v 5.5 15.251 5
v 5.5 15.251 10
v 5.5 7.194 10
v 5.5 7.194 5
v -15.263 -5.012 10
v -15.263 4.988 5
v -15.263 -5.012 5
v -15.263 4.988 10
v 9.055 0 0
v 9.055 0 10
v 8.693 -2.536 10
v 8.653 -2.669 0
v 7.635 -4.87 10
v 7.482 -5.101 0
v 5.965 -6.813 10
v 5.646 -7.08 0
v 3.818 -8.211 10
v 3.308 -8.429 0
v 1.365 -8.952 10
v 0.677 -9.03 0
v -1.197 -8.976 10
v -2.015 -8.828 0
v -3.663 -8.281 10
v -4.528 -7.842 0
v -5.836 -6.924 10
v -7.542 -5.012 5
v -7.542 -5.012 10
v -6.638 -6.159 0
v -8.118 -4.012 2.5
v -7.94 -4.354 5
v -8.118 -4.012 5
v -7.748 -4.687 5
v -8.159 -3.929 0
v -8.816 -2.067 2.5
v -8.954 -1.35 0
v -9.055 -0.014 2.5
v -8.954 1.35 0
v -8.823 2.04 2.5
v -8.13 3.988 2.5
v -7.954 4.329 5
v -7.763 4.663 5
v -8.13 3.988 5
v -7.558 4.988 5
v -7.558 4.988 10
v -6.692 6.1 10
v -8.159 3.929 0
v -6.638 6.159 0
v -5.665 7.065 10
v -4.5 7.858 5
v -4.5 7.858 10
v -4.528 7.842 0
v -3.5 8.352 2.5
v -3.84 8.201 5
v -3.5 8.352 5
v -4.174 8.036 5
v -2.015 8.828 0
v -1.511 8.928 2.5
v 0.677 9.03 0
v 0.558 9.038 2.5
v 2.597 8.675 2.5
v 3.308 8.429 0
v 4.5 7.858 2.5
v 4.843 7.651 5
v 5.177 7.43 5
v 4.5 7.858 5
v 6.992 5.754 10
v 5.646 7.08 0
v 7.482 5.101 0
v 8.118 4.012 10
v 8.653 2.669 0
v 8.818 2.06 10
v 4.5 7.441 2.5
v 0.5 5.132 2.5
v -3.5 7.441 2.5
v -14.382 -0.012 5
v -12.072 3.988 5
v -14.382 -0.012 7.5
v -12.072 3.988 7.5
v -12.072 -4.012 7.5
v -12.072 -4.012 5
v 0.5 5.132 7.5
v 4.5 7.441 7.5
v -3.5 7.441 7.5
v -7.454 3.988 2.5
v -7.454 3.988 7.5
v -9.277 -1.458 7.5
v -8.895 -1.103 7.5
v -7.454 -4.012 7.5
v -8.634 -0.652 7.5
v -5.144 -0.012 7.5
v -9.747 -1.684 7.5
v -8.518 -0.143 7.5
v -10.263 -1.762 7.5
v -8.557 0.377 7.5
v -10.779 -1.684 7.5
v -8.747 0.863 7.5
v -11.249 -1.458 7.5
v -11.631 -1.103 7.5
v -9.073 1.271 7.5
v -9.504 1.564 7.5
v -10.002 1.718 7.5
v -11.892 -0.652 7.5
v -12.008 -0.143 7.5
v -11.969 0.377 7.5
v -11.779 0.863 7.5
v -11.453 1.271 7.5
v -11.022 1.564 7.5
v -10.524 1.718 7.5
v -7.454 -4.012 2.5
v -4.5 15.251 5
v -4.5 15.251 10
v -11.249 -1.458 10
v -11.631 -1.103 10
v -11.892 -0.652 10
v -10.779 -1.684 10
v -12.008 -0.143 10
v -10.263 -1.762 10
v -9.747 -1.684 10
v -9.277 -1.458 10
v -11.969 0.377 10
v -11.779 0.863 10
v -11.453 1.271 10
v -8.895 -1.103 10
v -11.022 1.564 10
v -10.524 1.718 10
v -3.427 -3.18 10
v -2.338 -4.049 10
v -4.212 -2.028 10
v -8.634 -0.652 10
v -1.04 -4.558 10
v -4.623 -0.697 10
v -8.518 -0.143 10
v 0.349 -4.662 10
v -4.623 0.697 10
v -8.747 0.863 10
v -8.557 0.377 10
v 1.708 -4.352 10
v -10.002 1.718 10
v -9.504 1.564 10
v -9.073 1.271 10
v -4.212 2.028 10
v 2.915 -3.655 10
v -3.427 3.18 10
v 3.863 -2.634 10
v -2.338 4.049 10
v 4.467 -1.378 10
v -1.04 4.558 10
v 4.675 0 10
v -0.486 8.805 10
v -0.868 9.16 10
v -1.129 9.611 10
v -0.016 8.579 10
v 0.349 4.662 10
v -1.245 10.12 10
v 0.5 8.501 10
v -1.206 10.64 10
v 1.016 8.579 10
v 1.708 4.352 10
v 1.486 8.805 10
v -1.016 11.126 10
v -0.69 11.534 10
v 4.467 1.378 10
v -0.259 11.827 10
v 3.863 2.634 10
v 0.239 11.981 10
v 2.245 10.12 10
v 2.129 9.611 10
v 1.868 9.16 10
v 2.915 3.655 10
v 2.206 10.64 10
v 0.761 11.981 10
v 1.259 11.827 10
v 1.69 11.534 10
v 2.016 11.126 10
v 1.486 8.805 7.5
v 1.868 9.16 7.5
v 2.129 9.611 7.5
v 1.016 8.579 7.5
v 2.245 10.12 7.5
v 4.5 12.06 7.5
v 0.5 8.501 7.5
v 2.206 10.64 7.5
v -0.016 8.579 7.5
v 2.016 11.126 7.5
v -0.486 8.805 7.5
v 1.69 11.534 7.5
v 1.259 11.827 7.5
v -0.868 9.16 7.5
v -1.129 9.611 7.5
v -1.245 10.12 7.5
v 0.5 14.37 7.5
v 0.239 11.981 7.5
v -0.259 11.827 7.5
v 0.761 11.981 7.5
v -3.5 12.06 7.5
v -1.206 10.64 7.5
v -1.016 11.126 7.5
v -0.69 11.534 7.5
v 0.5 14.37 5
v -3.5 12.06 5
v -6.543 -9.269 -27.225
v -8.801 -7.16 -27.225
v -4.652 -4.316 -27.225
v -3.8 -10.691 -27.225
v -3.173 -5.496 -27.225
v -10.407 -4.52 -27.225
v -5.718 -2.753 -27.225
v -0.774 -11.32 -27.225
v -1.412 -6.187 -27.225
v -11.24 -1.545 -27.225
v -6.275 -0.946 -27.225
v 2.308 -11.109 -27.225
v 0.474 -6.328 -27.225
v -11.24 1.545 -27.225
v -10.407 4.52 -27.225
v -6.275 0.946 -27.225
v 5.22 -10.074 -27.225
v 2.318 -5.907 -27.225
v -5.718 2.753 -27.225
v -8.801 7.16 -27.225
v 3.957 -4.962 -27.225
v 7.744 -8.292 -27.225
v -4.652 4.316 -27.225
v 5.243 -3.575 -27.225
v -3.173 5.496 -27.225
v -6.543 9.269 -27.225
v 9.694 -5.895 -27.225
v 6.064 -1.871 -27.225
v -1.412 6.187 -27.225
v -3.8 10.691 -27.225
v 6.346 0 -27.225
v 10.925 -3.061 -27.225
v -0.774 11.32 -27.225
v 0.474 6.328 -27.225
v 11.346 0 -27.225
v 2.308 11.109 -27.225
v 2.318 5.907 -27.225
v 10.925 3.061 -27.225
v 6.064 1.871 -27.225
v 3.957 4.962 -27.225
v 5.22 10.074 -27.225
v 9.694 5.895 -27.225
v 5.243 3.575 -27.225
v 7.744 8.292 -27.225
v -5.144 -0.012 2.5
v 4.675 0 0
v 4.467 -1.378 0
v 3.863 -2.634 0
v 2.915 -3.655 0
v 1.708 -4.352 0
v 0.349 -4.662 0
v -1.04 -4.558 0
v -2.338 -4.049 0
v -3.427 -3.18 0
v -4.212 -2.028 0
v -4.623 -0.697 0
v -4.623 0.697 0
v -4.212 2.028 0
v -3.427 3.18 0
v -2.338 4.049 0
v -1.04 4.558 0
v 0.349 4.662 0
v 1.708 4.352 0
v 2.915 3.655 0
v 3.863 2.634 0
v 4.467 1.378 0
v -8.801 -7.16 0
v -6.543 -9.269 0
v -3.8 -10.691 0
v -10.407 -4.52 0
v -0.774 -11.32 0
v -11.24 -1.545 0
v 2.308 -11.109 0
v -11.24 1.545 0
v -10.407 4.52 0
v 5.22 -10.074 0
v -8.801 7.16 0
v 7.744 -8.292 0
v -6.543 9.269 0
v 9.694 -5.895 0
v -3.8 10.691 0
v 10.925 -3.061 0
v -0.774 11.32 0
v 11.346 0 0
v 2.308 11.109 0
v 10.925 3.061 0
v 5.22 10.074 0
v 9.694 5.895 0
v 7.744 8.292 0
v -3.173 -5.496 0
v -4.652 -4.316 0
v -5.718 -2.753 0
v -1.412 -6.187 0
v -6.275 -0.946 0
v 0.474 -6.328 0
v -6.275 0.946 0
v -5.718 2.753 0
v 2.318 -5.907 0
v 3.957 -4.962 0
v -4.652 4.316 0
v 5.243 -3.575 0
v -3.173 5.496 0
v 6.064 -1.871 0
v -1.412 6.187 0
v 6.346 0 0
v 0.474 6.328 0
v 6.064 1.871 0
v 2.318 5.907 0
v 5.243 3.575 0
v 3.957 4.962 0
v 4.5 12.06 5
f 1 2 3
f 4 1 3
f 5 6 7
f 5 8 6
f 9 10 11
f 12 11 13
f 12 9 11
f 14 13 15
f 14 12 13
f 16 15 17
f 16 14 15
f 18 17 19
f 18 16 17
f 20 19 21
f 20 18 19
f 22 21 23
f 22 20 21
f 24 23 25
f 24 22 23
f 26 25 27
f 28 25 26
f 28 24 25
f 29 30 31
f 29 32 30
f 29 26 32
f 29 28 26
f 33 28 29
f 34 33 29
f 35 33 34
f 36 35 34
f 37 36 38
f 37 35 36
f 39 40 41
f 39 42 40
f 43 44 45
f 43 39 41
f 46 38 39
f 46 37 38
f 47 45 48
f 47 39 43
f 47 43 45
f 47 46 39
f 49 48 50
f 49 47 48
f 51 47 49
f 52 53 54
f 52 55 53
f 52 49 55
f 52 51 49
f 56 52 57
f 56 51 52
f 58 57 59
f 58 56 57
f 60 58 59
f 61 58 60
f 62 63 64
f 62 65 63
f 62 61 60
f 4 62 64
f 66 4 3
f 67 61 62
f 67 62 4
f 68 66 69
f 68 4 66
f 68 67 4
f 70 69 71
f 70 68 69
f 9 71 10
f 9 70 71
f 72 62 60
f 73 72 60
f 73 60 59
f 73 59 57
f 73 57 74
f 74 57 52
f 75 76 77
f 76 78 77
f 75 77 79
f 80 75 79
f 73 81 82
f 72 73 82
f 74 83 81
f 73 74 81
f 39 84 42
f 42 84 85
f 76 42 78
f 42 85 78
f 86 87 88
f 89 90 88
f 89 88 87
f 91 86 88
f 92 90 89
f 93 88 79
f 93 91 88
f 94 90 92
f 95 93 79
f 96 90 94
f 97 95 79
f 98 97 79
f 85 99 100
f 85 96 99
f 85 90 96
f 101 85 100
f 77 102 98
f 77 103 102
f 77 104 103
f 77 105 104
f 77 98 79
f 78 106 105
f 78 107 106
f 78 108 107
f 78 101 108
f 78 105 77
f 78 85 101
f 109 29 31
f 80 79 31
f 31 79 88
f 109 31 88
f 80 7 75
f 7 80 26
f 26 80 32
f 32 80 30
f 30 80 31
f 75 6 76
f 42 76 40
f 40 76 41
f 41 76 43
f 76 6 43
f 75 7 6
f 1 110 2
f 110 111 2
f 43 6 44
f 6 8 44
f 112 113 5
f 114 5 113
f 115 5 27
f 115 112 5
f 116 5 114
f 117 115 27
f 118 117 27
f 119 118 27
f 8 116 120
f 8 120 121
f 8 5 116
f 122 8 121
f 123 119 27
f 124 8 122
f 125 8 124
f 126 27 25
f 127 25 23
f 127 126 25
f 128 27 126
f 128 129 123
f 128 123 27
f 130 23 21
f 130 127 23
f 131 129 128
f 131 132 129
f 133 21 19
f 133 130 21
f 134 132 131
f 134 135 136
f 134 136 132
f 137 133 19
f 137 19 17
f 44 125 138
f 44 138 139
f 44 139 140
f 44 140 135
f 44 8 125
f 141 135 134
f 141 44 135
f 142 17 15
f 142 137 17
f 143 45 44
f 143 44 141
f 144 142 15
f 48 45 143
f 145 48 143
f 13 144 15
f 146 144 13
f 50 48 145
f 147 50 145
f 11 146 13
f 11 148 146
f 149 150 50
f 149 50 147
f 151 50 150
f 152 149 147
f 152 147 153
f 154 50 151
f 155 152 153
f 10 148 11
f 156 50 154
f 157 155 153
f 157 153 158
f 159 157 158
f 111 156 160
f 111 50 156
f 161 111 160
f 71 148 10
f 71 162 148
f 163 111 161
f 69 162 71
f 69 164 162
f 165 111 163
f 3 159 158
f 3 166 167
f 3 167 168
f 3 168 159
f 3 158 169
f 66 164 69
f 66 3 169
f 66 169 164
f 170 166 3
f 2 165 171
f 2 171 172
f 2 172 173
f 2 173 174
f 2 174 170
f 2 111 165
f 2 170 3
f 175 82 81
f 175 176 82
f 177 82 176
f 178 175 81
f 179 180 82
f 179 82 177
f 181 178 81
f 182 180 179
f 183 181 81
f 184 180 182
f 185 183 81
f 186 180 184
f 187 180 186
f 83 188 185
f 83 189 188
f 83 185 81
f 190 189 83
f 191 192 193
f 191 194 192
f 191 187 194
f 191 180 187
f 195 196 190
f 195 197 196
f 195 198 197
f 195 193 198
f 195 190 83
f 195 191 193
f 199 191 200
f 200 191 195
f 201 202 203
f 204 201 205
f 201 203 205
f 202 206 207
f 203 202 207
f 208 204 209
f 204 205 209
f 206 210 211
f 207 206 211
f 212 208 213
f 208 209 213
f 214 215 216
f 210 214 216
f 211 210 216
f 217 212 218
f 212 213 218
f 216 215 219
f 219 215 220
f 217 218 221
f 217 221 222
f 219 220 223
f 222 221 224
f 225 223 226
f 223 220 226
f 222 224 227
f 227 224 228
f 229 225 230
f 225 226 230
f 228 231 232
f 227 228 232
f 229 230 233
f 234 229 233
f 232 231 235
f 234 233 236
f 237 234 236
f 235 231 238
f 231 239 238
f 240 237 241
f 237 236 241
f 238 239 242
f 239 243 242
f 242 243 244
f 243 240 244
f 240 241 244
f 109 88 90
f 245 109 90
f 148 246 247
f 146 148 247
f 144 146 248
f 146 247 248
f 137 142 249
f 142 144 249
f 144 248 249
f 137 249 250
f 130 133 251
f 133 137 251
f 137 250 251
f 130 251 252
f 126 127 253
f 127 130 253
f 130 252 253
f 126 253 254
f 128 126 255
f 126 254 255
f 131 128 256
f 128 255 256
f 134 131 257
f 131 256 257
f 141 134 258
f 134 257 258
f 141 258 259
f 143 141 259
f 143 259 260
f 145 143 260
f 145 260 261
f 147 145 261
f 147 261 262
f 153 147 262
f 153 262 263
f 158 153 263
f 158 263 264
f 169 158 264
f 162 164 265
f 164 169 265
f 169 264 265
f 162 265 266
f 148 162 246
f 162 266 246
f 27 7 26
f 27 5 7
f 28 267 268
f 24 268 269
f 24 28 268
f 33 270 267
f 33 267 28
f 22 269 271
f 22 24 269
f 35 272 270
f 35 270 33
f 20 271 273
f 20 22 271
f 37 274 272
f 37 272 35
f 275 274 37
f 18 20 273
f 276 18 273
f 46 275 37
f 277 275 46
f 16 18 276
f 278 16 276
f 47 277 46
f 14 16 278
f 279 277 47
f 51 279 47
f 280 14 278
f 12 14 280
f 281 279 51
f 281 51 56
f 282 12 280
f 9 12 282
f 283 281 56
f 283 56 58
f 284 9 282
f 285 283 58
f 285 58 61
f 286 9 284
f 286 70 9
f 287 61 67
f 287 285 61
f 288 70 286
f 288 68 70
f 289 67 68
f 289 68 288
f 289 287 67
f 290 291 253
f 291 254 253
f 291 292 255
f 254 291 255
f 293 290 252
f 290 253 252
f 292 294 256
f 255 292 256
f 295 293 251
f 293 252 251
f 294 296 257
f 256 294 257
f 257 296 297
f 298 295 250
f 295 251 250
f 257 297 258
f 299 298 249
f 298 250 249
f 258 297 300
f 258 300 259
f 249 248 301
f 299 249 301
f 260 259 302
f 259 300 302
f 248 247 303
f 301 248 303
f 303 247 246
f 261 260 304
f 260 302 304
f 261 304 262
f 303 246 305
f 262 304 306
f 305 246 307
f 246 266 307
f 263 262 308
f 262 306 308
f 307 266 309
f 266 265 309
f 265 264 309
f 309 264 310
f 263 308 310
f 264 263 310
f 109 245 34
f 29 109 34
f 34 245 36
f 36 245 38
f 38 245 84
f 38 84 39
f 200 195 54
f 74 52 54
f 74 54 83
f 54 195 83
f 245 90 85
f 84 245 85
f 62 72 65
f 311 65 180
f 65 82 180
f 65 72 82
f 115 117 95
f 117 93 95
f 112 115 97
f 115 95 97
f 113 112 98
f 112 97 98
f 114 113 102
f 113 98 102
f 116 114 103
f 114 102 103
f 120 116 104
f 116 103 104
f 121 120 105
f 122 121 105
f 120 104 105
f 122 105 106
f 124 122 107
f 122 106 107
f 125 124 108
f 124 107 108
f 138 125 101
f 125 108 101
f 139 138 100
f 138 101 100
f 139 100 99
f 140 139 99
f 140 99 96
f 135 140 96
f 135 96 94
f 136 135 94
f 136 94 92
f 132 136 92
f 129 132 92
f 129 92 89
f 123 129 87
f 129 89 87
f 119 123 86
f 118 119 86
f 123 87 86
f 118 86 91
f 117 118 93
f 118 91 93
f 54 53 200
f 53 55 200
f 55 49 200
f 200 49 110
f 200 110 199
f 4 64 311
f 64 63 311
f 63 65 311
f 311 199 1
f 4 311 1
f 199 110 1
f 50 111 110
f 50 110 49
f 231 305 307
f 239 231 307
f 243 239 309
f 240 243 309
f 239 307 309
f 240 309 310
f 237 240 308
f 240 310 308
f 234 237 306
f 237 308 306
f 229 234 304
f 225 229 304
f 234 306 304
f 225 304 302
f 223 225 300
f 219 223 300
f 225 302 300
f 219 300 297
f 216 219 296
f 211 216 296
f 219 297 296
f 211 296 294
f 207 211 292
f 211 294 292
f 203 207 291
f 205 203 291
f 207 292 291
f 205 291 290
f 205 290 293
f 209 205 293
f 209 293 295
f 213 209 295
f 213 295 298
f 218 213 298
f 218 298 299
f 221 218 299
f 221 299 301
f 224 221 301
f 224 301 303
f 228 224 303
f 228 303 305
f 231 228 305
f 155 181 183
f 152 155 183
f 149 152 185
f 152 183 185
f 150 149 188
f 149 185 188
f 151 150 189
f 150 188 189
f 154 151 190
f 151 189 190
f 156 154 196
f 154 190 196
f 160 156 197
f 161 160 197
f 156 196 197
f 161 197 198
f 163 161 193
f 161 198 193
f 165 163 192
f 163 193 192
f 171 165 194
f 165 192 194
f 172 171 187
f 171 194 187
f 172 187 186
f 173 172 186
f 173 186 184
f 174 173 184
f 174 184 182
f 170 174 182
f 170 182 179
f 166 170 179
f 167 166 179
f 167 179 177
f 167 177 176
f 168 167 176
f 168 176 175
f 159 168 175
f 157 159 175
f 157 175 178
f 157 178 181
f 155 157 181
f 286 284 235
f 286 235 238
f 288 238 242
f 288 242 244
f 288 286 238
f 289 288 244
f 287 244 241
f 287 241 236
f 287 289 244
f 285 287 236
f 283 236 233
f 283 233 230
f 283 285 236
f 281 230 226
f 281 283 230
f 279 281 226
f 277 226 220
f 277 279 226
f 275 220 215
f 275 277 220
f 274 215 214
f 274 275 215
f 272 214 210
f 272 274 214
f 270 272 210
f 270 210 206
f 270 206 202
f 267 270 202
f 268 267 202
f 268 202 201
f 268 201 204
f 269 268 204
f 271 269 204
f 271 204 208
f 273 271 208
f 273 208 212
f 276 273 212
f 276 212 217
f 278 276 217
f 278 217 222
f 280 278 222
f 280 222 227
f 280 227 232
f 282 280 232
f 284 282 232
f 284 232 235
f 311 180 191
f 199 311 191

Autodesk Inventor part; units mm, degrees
ref_plane "YZ Plane" through (0, 0, 0) normal (1, 0, 0) x (0, 1, 0)
ref_plane "XZ Plane" through (0, 0, 0) normal (0, 1, 0) x (-1, 0, 0)
ref_plane "XY Plane" through (0, 0, 0) normal (0, 0, 1) x (1, 0, 0)
sketch "Sketch1" plane through (0, 0, 0) normal (0, 0, 1) x (1, 0, 0)
  circle A0 centre (0, 0) radius 6.346
  circle A1 centre (0, 0) radius 11.346
  circle A2 centre (0, 0) radius 4.675
  circle A3 centre (0, 0) radius 9.0554
  dimension "d0" = 12.692
  dimension "d1" = 5
  dimension "d2" = 9.35
  dimension "d7" = 2.7094
extrude "Extrusion1" add sketch "Sketch1" against normal blind 27.225 contours A1 | A3
extrude "Extrusion3" add sketch "Sketch1" along normal blind 10 contours A0 | A3
sketch "Sketch2" plane through (0, 0, 10) normal (0, 0, 1) x (1, 0, 0)
  line L0 (0.5, 10.2508) -> (5.5, 10.2508)
  line L1 (0.5, 10.2508) -> (-4.5, 10.2508)
  line L2 (0.5, 10.2508) -> (0.5, 15.2508)
  line L3 (-10.263, -0.0122) -> (-10.263, 4.9878)
  line L4 (-10.263, -0.0122) -> (-15.263, -0.0122)
  line L5 (-10.263, -0.0122) -> (-10.263, -5.0122)
  line L6 (-10.263, 4.9878) -> (-7.5579, 4.9878)
  circle A0 centre (0, 0) radius 9.0554 projected
  line L7 (-10.263, 4.9878) -> (-15.263, 4.9878)
  line L8 (-15.263, 4.9878) -> (-15.263, -0.0122)
  line L9 (-10.263, -5.0122) -> (-7.5417, -5.0122)
  line L10 (-10.263, -5.0122) -> (-15.263, -5.0122)
  line L11 (-15.263, -5.0122) -> (-15.263, -0.0122)
  line L12 (0.5, 15.2508) -> (5.5, 15.2508)
  line L13 (5.5, 15.2508) -> (5.5, 10.2508)
  line L14 (5.5, 10.2508) -> (5.5, 7.1937)
  line L15 (0.5, 15.2508) -> (-4.5, 15.2508)
  line L16 (-4.5, 15.2508) -> (-4.5, 10.2508)
  line L17 (-4.5, 7.8581) -> (-4.5, 10.2508)
  dimension "d10" = 10.263
  dimension "d11" = 10.263
  dimension "d12" = 5
  dimension "d13" = 5
  dimension "d14" = 5
  dimension "d15" = 5
  dimension "d16" = 5
  dimension "d17" = 5
  dimension "d18" = 15.763
  dimension "d19" = 10.263
extrude "Extrusion4" add sketch "Sketch2" against normal blind 5 contours L2 L12 L13 L0 | L0 L14 A0 L17 L1 | L1 L16 L15 L2 | A0 L9 L5 L3 L6 | L3 L4 L8 L7 | L10 L11 L4 L5
sketch "Sketch4" plane through (0, 0, 5) normal (0, 0, -1) x (-1, 0, 0)
  line L0 (-5.5, 15.2508) -> (4.5, 15.2508) projected
  line L1 (-0.5, 15.2508) -> (-0.5, 9.7508)
  line L2 (3.5, 7.4414) -> (-0.5, 5.132)
  line L3 (-0.5, 5.132) -> (-4.5, 7.4414)
  line L4 (-4.5, 7.4414) -> (-4.5, 12.0602)
  line L5 (-4.5, 12.0602) -> (-0.5, 14.3696)
  line L6 (-0.5, 14.3696) -> (3.5, 12.0602)
  line L7 (3.5, 12.0602) -> (3.5, 7.4414)
  point P0 (0, 0)
  point P1 (3.5, 9.7508)
  dimension "d22" = 5.5
  dimension "d23" = 8
extrude "Extrusion5" cut sketch "Sketch4" along normal mid plane 5
sketch "Sketch5" plane through (0, 0, 5) normal (0, 0, -1) x (-1, 0, 0)
  line L0 (15.263, 4.9878) -> (15.263, -5.0122) projected
  line L1 (15.263, -0.0122) -> (9.763, -0.0122)
  line L2 (7.4536, -4.0122) -> (5.1442, -0.0122)
  line L3 (5.1442, -0.0122) -> (7.4536, 3.9878)
  line L4 (7.4536, 3.9878) -> (12.0724, 3.9878)
  line L5 (12.0724, 3.9878) -> (14.3818, -0.0122)
  line L6 (14.3818, -0.0122) -> (12.0724, -4.0122)
  line L7 (12.0724, -4.0122) -> (7.4536, -4.0122)
  line L8 (3.5, 12.0602) -> (3.5, 7.4414) projected
  point P0 (0, 0)
  dimension "d26" = 5.5
extrude "Extrusion6" cut sketch "Sketch5" along normal mid plane 5
hole "Hole1" at (0.5, 10.2508, 10) at (-10.263, -0.0122, 10) direction (0, 0, -1) diameter 3.5 depth 6.25 tip angle 118
properties part number "springHolder_final"
